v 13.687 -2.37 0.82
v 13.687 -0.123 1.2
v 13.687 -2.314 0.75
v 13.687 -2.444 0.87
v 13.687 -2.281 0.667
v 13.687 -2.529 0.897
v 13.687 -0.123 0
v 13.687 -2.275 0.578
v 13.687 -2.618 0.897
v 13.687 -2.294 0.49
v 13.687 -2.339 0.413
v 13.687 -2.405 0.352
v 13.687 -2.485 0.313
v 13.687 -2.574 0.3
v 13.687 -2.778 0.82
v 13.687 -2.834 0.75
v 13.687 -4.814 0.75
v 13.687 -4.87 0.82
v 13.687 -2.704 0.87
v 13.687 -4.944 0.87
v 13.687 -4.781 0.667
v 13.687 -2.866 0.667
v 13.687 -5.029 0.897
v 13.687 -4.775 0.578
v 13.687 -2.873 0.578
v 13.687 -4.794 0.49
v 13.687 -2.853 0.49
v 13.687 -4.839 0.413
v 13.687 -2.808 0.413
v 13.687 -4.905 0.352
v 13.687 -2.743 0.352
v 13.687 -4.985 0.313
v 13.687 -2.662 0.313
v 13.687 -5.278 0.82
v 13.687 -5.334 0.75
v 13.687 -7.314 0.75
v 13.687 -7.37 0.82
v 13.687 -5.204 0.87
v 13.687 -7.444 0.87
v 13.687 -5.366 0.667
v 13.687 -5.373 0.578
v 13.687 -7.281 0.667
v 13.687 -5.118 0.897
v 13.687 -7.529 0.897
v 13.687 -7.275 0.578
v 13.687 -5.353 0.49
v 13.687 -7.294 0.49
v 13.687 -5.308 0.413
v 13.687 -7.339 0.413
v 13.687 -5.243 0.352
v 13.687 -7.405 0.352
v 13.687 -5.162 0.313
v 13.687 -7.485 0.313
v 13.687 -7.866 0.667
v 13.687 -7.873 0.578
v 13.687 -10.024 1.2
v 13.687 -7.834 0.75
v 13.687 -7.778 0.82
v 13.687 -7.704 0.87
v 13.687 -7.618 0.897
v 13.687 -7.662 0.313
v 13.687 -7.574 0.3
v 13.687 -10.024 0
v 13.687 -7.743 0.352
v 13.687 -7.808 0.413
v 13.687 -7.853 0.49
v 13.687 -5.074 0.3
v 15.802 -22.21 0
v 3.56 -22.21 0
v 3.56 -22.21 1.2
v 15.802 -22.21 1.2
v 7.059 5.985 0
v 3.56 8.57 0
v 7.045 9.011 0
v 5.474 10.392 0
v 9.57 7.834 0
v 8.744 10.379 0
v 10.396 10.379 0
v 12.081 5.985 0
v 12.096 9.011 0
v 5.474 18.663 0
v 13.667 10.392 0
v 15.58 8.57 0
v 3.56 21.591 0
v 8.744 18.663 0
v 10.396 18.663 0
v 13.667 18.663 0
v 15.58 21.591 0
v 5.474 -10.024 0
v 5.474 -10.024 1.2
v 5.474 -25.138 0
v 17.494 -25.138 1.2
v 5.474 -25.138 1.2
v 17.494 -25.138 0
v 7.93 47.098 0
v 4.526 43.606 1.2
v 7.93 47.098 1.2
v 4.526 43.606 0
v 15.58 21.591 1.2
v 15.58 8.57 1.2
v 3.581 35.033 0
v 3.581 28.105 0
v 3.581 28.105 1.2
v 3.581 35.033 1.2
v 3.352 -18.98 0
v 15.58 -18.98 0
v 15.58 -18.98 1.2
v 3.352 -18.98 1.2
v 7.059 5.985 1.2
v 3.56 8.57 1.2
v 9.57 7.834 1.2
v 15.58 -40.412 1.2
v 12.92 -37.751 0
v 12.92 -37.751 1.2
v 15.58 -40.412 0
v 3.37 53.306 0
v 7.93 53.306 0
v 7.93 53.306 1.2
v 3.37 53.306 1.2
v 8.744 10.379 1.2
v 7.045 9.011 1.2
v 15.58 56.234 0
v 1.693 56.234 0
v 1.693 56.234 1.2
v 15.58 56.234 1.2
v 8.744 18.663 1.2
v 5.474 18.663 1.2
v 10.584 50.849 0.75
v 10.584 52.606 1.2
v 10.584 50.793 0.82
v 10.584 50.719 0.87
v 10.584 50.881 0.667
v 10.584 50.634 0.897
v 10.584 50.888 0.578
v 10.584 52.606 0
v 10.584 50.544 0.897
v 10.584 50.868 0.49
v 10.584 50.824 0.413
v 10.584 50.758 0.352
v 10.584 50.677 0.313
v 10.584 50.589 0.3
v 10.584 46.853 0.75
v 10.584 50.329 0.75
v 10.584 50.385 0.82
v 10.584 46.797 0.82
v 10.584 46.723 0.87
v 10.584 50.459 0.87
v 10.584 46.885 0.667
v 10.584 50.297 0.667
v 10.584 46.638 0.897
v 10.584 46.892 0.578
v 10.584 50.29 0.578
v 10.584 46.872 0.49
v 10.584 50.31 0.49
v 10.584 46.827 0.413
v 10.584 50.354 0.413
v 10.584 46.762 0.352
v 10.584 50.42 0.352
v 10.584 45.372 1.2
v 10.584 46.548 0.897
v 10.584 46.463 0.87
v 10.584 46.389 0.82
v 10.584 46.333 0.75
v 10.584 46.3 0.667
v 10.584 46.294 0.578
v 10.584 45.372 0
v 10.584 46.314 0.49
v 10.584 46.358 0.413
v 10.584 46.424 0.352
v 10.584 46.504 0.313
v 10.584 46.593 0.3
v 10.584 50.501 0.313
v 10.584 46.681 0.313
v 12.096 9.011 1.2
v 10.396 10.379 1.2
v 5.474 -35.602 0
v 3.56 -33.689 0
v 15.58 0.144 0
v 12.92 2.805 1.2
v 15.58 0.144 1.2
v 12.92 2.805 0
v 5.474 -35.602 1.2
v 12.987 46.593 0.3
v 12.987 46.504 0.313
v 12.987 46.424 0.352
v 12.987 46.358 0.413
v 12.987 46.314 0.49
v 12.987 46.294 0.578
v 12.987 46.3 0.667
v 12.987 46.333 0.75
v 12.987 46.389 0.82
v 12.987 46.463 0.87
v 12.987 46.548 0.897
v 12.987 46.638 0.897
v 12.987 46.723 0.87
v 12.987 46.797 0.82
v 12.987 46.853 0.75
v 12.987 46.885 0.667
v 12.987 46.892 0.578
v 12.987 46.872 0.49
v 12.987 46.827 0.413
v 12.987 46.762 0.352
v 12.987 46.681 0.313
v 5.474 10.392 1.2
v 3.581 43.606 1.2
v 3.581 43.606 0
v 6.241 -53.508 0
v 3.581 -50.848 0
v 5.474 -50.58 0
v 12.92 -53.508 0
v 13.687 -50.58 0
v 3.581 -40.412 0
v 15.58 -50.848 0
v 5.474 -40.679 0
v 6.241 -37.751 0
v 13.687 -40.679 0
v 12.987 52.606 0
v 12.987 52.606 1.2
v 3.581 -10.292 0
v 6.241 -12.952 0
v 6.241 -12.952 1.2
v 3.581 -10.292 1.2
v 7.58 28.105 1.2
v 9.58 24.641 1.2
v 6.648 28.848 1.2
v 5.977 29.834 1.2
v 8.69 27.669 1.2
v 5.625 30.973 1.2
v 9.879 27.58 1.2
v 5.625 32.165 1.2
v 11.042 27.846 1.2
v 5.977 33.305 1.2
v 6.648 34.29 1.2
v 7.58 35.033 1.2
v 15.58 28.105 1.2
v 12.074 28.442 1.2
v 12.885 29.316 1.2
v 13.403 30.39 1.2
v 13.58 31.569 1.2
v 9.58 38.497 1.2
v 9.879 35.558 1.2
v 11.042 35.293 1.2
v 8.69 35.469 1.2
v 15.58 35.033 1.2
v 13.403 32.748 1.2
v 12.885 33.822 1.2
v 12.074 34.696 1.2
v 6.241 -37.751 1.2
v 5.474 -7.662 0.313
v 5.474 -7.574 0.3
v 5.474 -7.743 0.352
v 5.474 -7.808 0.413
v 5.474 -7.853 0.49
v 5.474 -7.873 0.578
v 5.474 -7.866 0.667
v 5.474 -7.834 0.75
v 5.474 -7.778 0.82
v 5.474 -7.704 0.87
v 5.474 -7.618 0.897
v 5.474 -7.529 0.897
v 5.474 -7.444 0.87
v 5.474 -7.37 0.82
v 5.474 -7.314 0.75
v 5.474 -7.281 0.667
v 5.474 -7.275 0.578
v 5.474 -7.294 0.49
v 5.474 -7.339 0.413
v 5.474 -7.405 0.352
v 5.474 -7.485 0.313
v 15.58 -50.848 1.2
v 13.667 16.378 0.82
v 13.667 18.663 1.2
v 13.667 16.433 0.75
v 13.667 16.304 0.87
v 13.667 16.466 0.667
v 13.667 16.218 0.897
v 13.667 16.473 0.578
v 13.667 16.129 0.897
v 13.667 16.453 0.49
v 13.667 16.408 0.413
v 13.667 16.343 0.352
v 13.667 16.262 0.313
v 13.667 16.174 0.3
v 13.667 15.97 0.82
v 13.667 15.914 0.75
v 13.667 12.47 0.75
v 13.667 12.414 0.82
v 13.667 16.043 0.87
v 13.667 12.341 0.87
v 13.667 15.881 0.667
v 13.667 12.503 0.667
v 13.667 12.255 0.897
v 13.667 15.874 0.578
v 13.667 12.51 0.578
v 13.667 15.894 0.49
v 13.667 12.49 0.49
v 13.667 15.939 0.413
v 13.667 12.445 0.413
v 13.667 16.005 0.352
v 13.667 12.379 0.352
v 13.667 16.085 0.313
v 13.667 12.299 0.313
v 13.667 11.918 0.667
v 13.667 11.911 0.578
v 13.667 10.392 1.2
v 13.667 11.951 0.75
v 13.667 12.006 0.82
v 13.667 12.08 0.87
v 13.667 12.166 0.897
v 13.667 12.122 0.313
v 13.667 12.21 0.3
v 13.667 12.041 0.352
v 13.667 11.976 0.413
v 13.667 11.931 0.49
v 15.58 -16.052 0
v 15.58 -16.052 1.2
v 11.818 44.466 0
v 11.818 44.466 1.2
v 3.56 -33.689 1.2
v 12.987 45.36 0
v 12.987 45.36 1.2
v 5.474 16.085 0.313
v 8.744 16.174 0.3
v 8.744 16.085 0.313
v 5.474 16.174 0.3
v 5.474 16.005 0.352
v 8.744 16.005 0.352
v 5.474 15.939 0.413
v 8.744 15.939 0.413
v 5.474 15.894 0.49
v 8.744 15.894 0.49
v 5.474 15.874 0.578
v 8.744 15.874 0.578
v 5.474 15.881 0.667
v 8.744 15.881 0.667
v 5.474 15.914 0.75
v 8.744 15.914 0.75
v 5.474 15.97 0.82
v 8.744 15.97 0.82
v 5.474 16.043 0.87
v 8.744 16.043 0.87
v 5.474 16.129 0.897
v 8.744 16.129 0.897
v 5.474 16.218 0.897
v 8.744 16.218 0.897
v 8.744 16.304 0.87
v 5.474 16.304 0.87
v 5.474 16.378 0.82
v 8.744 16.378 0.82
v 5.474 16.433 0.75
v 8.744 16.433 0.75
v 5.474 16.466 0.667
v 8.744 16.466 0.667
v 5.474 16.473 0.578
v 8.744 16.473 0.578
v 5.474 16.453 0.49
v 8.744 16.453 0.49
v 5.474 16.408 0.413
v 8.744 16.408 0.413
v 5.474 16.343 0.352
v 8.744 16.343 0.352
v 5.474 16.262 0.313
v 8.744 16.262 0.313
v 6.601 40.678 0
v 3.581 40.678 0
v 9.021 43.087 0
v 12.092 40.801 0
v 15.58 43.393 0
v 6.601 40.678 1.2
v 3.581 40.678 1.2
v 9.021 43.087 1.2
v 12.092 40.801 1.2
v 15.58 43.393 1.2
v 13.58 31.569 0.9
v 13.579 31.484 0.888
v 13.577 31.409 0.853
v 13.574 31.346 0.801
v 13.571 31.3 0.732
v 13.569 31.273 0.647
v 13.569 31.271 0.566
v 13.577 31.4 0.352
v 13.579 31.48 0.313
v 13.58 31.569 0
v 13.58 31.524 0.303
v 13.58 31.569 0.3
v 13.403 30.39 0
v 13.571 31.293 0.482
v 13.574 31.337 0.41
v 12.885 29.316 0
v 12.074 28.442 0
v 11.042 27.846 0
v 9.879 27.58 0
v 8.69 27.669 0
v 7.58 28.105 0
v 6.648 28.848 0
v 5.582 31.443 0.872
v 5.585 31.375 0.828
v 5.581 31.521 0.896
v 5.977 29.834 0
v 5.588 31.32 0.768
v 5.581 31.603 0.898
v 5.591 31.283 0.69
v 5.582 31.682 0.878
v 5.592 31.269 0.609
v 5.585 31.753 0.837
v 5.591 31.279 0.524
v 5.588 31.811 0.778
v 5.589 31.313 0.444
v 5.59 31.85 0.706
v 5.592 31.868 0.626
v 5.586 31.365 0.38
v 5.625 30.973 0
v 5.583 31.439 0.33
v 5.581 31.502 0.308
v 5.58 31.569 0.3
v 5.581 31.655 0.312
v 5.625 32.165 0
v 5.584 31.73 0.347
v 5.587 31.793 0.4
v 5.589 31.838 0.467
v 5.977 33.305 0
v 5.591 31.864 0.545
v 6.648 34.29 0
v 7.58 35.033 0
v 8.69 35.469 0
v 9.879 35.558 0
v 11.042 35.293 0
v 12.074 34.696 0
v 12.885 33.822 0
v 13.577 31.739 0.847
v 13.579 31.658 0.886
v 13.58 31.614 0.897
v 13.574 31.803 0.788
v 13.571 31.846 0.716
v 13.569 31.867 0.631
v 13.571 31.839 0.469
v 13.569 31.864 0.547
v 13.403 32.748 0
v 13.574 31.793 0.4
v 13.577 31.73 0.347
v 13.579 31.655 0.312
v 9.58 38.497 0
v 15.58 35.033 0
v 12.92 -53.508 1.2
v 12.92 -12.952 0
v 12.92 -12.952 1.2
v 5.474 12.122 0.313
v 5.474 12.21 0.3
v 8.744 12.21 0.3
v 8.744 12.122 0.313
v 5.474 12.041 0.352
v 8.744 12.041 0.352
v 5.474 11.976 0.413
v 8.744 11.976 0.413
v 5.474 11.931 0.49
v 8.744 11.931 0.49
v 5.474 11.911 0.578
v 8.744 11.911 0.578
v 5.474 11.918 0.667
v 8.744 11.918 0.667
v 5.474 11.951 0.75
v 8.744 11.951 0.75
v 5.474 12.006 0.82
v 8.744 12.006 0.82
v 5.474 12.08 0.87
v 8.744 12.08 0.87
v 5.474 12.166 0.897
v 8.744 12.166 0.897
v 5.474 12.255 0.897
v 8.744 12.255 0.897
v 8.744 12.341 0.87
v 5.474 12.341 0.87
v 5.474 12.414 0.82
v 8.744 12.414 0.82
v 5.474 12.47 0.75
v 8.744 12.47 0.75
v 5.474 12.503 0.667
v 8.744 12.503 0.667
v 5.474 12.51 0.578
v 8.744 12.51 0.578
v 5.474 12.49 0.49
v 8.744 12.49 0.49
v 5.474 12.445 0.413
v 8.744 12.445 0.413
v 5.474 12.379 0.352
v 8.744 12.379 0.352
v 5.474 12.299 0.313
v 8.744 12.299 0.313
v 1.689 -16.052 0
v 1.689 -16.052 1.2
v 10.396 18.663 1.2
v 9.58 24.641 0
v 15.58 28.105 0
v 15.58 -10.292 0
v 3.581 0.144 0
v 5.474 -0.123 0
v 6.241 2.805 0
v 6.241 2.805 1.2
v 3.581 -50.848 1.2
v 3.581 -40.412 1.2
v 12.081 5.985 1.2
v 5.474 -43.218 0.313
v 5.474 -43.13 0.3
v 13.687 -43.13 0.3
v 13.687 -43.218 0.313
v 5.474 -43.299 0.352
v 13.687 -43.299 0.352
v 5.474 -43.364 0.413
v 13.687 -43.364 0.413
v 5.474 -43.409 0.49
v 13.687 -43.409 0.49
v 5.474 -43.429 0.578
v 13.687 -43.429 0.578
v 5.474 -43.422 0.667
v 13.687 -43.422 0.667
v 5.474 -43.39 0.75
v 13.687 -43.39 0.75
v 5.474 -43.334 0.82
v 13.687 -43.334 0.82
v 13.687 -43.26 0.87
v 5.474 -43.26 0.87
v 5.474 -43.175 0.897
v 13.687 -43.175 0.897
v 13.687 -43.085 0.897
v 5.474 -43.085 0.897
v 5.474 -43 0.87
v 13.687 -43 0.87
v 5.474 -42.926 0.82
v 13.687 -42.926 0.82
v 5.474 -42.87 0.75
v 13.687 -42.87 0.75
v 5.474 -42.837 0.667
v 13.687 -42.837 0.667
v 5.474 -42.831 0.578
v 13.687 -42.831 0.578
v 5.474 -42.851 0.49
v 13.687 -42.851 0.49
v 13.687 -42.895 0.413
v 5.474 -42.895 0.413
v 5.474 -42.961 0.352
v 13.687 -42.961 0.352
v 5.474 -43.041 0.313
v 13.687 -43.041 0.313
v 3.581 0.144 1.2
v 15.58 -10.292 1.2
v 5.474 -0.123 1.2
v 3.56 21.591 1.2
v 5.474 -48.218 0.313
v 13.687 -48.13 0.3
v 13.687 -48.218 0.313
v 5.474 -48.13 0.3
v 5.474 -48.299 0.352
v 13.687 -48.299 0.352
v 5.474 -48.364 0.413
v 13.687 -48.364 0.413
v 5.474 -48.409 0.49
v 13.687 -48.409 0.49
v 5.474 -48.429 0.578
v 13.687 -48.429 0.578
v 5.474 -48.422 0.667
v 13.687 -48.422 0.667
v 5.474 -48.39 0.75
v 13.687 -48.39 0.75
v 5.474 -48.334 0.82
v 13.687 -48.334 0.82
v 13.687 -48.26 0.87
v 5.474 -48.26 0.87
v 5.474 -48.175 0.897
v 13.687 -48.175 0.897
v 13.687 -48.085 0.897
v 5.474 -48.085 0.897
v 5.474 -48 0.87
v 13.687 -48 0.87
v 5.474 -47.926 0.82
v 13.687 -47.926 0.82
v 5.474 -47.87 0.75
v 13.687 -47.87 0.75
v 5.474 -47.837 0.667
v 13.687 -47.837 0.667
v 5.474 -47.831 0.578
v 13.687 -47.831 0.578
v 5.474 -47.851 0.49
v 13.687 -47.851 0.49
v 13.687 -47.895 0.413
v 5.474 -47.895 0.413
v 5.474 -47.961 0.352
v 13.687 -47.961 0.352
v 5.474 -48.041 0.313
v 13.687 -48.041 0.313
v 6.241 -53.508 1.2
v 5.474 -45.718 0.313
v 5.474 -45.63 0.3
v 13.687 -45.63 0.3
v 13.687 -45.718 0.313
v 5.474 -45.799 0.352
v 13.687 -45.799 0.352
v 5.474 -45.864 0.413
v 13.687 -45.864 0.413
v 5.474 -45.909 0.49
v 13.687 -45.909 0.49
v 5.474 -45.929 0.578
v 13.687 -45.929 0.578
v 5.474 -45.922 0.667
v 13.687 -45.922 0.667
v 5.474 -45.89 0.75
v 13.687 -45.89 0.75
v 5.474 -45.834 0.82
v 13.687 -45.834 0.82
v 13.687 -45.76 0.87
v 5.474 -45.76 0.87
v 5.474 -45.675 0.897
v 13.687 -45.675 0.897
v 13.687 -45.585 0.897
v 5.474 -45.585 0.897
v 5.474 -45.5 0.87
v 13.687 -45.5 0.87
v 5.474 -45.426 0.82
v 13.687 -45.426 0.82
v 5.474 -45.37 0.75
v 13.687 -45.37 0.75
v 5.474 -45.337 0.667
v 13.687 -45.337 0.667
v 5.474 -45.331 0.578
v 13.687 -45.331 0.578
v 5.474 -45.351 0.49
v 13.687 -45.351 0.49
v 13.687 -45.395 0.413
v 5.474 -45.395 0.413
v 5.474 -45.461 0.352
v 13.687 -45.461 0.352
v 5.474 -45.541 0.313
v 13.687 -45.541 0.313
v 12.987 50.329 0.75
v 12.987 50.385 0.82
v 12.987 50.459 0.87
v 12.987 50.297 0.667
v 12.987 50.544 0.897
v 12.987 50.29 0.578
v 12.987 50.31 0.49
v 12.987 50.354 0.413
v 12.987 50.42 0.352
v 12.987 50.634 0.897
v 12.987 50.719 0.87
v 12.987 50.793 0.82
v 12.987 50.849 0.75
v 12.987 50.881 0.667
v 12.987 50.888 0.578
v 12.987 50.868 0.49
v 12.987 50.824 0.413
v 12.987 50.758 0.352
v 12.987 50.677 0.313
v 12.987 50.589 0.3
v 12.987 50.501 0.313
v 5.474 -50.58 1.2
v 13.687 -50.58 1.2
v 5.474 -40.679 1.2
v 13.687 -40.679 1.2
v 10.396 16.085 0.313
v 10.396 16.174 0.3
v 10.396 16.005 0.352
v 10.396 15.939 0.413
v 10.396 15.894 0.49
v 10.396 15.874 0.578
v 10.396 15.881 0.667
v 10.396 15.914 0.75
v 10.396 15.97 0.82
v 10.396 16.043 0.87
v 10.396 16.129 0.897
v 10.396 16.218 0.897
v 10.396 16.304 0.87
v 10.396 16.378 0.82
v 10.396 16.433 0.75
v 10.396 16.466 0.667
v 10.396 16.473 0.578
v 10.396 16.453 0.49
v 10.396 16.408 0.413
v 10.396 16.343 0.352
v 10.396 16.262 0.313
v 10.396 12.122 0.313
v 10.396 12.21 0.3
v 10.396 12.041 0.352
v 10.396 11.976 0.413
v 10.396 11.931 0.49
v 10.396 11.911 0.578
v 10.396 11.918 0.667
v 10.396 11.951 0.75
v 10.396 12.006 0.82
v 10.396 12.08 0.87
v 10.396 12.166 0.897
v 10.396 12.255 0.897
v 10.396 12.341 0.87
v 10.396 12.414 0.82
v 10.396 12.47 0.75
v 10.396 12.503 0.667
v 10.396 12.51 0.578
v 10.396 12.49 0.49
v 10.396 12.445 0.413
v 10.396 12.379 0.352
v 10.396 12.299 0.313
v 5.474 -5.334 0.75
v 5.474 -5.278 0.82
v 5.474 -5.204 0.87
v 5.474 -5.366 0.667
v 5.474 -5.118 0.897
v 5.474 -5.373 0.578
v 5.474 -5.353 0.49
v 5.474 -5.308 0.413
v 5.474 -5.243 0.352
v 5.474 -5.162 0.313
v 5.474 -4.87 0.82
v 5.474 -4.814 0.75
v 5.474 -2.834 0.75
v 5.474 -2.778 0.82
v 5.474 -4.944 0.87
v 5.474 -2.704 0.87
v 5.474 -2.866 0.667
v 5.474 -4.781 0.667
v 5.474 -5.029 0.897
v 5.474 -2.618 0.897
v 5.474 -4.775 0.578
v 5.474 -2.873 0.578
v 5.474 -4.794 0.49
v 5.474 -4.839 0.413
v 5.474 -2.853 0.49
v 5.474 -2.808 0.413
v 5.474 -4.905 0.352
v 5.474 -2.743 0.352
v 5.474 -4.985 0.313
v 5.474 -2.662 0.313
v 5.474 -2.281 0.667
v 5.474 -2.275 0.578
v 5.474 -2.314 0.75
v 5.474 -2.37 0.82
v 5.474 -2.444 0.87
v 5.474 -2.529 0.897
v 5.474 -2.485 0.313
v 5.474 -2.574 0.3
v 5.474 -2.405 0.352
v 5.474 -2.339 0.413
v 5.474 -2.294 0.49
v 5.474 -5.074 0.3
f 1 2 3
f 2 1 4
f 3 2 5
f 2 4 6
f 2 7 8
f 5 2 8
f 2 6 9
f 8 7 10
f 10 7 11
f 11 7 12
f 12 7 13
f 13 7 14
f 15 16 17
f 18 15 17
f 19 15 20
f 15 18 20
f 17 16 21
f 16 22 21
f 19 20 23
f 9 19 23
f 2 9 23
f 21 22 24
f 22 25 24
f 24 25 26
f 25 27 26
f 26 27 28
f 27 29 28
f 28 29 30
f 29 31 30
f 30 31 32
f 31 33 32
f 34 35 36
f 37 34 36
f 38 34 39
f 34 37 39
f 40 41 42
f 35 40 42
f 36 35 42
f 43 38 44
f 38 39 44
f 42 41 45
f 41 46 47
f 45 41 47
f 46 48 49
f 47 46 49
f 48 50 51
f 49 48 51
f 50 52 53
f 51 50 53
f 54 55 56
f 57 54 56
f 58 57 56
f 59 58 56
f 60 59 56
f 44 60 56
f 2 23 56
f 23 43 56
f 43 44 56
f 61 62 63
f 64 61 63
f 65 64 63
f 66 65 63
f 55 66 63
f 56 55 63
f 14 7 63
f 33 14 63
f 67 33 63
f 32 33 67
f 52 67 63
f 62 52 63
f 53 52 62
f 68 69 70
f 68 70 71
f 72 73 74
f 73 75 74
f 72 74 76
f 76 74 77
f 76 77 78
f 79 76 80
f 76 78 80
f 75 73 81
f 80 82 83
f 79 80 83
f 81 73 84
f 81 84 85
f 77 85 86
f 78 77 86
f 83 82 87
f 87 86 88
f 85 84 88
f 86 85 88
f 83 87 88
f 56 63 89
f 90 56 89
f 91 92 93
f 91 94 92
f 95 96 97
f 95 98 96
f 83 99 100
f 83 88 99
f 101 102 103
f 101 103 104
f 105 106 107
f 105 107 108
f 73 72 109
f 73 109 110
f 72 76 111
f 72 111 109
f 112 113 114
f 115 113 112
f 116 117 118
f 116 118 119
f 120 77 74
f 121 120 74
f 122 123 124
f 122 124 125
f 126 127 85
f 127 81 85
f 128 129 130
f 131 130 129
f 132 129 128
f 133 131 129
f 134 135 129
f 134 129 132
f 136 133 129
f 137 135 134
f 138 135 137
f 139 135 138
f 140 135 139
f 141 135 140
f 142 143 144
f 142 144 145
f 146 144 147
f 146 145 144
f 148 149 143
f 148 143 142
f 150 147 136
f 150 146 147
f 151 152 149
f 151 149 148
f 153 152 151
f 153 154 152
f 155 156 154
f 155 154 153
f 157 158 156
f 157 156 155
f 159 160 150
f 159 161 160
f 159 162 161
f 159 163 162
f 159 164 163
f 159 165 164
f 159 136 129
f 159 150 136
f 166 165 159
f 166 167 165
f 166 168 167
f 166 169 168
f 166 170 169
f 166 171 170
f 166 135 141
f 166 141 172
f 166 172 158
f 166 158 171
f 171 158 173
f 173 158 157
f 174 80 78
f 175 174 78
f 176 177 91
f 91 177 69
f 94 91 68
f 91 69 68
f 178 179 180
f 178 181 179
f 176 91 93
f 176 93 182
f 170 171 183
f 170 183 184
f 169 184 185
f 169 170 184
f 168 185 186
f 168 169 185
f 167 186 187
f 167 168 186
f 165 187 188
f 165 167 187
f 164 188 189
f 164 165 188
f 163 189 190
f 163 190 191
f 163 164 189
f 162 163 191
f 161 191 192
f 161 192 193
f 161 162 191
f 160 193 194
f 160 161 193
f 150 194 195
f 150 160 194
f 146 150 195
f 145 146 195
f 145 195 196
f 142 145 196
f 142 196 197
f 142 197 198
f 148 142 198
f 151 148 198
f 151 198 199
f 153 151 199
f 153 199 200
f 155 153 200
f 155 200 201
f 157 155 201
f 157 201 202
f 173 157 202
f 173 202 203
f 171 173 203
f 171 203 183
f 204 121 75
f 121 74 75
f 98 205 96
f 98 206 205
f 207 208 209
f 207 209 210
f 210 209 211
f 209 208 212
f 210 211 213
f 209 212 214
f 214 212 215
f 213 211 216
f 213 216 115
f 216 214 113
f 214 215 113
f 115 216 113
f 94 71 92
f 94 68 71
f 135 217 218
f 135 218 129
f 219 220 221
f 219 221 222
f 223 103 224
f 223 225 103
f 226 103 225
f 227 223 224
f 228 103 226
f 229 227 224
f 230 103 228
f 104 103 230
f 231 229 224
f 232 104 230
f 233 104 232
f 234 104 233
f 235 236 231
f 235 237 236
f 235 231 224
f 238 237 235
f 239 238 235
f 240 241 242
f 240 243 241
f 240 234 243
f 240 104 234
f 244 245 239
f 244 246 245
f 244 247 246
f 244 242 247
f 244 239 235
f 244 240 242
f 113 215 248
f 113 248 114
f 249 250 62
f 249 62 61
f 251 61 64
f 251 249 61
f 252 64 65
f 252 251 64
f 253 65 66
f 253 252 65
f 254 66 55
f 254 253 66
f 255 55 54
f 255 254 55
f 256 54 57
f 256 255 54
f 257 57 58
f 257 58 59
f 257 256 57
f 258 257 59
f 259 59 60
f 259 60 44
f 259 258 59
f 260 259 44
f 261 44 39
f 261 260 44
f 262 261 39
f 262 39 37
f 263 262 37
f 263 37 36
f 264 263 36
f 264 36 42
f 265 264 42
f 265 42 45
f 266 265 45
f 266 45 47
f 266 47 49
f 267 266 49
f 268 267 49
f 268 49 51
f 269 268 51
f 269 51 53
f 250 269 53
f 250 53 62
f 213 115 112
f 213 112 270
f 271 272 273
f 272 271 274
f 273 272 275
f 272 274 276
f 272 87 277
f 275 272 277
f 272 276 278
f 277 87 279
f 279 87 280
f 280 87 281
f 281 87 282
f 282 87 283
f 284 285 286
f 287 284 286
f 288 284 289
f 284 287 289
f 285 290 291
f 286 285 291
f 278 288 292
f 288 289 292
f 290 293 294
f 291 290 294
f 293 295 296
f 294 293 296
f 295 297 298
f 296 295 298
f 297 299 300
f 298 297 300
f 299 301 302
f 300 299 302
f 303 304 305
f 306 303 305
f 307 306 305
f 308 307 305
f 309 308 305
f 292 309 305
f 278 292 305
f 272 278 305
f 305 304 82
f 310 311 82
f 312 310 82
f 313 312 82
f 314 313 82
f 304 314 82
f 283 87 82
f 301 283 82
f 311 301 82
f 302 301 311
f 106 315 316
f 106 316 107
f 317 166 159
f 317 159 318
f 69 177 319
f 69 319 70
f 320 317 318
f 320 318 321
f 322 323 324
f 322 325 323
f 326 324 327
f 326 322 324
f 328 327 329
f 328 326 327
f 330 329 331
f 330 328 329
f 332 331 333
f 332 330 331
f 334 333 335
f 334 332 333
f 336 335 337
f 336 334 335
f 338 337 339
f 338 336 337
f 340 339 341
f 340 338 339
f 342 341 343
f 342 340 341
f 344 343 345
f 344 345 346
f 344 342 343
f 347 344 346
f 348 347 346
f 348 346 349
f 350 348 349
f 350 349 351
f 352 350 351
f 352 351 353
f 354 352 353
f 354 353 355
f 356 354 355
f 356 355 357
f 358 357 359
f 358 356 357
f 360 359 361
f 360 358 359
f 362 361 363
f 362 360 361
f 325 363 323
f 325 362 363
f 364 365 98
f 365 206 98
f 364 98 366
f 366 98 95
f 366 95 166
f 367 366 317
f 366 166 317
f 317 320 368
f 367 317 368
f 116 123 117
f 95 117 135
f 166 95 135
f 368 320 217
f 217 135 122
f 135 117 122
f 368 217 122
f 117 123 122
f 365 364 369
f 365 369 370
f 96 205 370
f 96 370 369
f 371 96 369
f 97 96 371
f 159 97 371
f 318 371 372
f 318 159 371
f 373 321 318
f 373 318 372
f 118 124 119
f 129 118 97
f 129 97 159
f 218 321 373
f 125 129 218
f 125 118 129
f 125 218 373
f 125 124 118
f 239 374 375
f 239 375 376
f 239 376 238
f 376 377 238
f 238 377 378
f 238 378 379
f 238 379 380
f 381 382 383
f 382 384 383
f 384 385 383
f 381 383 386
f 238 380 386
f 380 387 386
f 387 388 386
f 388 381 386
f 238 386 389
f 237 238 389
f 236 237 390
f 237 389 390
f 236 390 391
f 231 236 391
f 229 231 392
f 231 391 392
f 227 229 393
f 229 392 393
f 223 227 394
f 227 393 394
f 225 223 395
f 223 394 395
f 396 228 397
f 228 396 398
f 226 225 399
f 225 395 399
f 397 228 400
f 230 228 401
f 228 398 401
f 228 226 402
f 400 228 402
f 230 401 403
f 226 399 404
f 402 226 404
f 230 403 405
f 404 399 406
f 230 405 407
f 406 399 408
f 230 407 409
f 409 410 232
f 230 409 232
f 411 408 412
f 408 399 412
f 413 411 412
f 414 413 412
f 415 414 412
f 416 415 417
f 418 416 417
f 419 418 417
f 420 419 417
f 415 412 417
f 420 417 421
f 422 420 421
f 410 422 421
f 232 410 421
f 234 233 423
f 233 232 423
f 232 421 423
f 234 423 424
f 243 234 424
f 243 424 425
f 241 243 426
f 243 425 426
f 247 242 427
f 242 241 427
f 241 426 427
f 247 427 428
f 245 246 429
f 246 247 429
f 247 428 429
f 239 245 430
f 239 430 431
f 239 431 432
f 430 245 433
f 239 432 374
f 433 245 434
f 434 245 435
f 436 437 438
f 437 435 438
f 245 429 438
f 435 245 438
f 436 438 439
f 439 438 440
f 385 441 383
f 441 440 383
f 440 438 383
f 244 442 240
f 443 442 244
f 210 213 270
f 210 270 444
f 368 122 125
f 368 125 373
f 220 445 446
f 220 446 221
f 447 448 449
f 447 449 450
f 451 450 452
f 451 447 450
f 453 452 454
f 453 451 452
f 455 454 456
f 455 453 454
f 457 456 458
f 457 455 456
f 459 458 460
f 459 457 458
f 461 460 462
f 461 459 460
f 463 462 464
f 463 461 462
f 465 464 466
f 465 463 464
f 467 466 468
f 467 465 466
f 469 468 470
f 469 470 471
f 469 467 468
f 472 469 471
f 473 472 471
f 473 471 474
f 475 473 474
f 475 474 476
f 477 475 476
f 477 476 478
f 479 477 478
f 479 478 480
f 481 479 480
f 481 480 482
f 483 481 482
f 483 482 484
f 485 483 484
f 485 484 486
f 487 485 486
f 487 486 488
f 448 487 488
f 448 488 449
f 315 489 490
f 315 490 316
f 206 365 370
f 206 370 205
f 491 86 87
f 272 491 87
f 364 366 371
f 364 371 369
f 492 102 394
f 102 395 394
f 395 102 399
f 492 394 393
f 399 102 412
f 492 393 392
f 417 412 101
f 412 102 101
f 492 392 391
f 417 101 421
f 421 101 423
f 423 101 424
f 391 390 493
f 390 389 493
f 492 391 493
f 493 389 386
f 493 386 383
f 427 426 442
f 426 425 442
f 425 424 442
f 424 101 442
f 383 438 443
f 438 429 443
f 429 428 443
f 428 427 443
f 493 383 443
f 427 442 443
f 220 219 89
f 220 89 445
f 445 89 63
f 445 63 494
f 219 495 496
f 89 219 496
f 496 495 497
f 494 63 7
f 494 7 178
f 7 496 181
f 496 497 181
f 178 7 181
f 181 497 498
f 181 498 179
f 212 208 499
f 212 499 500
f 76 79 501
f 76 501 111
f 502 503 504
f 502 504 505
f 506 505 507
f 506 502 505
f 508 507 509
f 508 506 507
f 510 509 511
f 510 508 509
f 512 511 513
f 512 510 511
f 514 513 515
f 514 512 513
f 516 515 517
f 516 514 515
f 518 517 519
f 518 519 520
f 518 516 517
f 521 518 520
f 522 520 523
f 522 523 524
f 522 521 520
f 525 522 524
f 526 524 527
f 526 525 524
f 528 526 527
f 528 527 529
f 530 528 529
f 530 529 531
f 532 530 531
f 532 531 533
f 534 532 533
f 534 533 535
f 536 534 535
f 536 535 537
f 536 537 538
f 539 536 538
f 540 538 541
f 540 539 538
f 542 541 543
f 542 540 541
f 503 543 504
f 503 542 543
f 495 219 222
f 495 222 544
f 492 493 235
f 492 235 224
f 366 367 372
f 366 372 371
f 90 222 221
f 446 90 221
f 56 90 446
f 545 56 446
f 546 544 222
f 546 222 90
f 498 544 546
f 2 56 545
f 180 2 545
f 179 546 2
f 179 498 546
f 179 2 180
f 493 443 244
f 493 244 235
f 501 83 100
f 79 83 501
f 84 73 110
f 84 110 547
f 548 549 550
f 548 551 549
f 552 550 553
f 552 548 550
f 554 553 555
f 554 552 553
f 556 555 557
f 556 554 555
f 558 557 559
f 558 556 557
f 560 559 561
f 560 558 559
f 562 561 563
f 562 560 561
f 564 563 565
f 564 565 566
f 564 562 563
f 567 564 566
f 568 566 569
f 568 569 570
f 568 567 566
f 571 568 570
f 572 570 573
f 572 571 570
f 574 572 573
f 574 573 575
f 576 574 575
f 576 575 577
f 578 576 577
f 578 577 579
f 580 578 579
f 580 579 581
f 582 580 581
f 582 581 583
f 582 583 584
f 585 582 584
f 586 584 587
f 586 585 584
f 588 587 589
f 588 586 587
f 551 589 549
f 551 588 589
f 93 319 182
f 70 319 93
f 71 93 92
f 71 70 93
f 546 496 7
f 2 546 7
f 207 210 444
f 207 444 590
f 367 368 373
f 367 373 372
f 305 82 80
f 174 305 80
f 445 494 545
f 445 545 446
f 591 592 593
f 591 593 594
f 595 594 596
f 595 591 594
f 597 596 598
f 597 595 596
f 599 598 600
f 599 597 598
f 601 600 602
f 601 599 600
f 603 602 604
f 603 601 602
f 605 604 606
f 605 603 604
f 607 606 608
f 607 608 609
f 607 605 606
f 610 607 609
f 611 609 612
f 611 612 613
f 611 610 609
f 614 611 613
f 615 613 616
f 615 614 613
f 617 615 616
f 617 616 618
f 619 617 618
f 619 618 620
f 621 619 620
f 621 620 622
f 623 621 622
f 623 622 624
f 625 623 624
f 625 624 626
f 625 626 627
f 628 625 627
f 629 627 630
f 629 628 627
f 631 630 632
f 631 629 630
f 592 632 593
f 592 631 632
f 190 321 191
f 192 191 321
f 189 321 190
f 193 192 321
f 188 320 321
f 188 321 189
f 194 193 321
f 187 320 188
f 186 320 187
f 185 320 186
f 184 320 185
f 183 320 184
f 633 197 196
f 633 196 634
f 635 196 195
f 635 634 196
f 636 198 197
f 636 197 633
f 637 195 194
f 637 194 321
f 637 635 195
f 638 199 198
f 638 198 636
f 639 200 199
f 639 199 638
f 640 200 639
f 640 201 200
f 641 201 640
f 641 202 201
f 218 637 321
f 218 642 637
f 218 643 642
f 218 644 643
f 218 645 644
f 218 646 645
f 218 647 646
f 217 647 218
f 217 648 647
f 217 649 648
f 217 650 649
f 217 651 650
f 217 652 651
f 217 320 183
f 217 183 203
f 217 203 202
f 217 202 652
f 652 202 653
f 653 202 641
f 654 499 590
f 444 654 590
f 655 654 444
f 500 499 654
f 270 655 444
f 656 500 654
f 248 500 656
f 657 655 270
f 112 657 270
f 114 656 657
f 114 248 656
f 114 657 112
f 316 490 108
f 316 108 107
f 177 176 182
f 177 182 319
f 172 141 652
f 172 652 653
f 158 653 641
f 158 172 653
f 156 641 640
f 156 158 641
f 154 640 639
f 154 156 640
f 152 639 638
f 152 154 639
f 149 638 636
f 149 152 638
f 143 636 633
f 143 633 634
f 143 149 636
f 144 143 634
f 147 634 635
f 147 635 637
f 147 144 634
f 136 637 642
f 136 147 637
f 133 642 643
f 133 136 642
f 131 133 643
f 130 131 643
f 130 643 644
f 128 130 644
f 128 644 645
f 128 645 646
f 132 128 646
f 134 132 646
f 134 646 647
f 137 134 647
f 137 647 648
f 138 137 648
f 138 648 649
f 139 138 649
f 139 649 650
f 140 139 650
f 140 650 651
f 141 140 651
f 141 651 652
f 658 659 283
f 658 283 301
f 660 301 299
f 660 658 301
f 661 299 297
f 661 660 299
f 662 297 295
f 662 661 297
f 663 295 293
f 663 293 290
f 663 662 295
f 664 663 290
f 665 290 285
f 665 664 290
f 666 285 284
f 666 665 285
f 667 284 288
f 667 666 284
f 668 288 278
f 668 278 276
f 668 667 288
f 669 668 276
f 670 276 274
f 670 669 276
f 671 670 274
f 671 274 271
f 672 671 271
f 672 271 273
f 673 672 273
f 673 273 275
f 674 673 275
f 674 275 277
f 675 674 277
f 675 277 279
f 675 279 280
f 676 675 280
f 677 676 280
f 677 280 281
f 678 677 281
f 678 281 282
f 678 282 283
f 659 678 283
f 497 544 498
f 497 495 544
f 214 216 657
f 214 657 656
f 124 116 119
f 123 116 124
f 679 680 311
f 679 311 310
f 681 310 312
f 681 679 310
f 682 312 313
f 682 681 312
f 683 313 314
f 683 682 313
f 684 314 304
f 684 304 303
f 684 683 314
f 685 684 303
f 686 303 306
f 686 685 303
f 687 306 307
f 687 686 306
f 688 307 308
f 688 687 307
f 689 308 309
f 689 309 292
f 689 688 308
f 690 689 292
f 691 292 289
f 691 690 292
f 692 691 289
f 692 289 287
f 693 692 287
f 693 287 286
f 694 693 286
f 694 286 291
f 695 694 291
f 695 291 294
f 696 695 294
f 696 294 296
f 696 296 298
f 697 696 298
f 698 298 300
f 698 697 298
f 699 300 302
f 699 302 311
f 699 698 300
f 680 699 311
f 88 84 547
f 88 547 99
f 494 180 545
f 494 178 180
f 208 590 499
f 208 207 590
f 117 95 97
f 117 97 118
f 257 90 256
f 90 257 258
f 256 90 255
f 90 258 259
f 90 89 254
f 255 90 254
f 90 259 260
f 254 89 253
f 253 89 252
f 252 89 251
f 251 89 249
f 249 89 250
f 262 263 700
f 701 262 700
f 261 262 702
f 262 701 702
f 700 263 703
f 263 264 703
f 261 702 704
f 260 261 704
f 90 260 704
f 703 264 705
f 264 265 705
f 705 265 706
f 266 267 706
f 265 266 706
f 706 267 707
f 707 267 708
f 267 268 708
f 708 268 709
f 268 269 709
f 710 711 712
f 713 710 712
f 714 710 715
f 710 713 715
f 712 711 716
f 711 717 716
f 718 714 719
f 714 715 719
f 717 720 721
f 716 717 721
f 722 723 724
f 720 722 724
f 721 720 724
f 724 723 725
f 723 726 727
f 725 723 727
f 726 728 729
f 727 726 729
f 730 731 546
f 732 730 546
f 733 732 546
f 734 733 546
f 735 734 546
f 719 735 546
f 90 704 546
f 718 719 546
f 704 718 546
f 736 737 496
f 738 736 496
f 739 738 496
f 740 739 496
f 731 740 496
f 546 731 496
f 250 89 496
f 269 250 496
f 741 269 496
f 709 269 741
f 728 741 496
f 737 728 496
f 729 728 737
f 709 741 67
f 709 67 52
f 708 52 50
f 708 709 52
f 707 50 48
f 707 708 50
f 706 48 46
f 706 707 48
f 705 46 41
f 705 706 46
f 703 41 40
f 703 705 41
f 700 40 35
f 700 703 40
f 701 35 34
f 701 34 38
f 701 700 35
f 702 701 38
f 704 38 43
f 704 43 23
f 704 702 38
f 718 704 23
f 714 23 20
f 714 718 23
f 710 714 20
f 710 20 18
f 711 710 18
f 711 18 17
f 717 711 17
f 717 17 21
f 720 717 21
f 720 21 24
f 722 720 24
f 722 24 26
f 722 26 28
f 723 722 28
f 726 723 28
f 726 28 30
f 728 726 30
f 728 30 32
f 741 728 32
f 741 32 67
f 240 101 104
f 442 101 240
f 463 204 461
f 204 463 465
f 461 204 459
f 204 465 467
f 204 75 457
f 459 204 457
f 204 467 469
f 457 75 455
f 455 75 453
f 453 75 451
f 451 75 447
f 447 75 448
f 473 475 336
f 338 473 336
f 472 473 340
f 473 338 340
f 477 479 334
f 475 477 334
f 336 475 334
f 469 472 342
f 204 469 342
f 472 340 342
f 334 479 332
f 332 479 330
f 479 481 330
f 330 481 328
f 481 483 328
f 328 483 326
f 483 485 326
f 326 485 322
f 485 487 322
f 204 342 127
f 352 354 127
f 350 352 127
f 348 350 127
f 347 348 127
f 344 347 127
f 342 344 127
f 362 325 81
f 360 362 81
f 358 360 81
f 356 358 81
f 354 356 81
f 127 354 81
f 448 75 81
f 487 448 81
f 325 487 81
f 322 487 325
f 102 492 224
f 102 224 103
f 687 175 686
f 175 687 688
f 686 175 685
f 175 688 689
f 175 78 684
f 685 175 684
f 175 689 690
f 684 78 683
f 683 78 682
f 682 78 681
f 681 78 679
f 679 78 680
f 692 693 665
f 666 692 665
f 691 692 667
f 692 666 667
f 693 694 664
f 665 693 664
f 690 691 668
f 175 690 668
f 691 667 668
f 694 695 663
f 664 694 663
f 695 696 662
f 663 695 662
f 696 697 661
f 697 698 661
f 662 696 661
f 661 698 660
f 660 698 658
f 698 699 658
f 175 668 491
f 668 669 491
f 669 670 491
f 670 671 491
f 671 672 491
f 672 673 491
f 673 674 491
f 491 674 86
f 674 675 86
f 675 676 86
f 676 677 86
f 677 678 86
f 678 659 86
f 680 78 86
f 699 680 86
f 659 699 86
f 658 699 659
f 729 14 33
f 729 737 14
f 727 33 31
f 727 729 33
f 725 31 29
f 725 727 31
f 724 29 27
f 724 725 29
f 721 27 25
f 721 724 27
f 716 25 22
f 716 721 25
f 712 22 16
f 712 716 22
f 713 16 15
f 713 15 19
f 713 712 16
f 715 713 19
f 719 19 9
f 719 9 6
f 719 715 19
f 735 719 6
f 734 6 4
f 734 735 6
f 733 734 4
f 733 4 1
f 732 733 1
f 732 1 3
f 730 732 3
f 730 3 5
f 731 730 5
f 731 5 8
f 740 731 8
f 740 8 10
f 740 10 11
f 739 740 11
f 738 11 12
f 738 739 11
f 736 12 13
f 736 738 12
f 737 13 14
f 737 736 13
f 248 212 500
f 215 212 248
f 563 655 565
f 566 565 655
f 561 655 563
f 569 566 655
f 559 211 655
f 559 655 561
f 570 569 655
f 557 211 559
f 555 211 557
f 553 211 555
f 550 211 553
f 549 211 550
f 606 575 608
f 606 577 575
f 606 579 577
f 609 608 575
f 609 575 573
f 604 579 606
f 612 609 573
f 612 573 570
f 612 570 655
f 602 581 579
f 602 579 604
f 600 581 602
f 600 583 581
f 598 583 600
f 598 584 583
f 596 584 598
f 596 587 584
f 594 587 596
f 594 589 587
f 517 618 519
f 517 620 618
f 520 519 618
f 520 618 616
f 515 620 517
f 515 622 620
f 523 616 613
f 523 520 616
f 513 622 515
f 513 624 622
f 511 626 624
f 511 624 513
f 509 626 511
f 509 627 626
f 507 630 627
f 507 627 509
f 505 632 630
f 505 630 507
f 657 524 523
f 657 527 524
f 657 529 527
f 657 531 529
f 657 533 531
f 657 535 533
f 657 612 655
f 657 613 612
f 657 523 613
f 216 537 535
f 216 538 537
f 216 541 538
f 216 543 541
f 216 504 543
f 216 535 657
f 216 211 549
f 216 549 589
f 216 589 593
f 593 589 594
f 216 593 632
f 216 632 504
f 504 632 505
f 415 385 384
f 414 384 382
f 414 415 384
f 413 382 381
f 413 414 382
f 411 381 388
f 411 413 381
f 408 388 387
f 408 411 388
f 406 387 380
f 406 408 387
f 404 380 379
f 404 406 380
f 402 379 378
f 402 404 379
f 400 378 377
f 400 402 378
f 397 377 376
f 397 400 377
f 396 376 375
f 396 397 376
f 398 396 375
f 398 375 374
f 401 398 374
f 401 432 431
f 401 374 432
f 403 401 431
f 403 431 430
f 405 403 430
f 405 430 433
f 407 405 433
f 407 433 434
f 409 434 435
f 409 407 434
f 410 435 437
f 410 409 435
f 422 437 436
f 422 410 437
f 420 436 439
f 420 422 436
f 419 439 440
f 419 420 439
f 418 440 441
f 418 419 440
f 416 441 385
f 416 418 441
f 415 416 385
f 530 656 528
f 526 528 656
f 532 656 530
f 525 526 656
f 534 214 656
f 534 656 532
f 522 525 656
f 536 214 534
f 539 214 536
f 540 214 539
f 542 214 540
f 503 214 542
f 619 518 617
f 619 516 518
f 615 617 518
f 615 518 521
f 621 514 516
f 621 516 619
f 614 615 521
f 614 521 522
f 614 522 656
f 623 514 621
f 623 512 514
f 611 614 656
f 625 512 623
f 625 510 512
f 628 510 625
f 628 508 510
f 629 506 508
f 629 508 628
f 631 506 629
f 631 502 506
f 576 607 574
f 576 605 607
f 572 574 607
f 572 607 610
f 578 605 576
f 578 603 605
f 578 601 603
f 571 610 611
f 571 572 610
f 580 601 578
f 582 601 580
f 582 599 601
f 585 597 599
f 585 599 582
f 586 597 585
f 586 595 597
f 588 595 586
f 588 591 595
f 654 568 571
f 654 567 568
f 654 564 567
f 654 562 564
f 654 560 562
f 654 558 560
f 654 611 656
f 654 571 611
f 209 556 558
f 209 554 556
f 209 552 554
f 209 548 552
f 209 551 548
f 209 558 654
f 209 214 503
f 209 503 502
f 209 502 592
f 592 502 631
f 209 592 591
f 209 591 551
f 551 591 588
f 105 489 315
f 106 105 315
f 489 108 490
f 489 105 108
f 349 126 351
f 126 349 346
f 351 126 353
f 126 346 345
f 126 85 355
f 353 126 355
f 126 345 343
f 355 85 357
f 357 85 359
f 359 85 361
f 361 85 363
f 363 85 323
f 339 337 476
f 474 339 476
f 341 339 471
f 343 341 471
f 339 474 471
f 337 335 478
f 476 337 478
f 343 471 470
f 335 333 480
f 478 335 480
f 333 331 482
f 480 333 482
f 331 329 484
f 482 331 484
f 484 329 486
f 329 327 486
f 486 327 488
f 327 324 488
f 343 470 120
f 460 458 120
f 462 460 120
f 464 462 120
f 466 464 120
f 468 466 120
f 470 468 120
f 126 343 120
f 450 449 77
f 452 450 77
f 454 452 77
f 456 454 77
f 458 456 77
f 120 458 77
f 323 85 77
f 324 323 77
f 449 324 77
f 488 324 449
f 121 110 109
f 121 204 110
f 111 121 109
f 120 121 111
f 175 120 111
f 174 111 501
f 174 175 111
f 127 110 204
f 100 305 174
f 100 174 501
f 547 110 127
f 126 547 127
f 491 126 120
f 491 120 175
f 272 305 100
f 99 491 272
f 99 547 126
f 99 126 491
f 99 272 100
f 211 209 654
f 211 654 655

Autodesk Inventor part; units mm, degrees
ref_plane "YZ Plane" through (0, 0, 0) normal (1, 0, 0) x (0, 1, 0)
ref_plane "XZ Plane" through (0, 0, 0) normal (0, 1, 0) x (-1, 0, 0)
ref_plane "XY Plane" through (0, 0, 0) normal (0, 0, 1) x (1, 0, 0)
sketch "Sketch1" plane through (0, 0, 0) normal (0, 0, 1) x (1, 0, 0)
  line L0 (13.187, 45.2611) -> (13.187, 52.8058) construction
  line L1 (11.8207, 44.2163) -> (13.187, 45.2611) construction
  line L2 (10.3841, 45.2712) -> (11.8207, 44.2163) construction
  line L3 (10.3841, 52.8058) -> (10.3841, 45.2712) construction
  line L4 (13.187, 52.8058) -> (10.3841, 52.8058) construction
  line L5 (3.0806, 40.1778) -> (3.0806, 44.1058) construction
  line L6 (6.8077, 40.1778) -> (3.0806, 40.1778) construction
  line L7 (9.0681, 42.4281) -> (6.8077, 40.1778) construction
  line L8 (12.0919, 40.1778) -> (9.0681, 42.4281) construction
  line L9 (16.0802, 43.1414) -> (12.0919, 40.1778) construction
  line L10 (16.0802, 56.7338) -> (16.0802, 43.1414) construction
  line L11 (0.8302, 56.7338) -> (16.0802, 56.7338) construction
  line L12 (3.0806, 52.8058) -> (0.8302, 56.7338) construction
  line L13 (7.4305, 52.8058) -> (3.0806, 52.8058) construction
  line L14 (7.4305, 47.3013) -> (7.4305, 52.8058) construction
  line L15 (4.3156, 44.1058) -> (7.4305, 47.3013) construction
  line L16 (3.0806, 44.1058) -> (4.3156, 44.1058) construction
  line L17 (3.0806, 27.8164) -> (3.0806, 35.3218) construction
  line L18 (9.5804, 24.0637) -> (3.0806, 27.8164) construction
  line L19 (16.0802, 27.8164) -> (9.5804, 24.0637) construction
  line L20 (16.0802, 35.3218) -> (16.0802, 27.8164) construction
  line L21 (9.5804, 39.0745) -> (16.0802, 35.3218) construction
  line L22 (3.0806, 35.3218) -> (9.5804, 39.0745) construction
  circle A0 centre (9.5804, 31.5691) radius 3.5 construction
  line L23 (13.1669, 10.6183) -> (13.1669, 18.163) construction
  line L24 (12.0819, 9.664) -> (13.1669, 10.6183) construction
  line L25 (10.8965, 10.6183) -> (12.0819, 9.664) construction
  line L26 (10.8965, 18.163) -> (10.8965, 10.6183) construction
  line L27 (13.1669, 18.163) -> (10.8965, 18.163) construction
  line L28 (8.2443, 10.6183) -> (8.2443, 18.163) construction
  line L29 (7.0588, 9.664) -> (8.2443, 10.6183) construction
  line L30 (5.9739, 10.6183) -> (7.0588, 9.664) construction
  line L31 (5.9739, 18.163) -> (5.9739, 10.6183) construction
  line L32 (8.2443, 18.163) -> (5.9739, 18.163) construction
  line L33 (7.0588, 5.3642) -> (3.0605, 8.3178) construction
  line L34 (9.5704, 7.2127) -> (7.0588, 5.3642) construction
  line L35 (12.0819, 5.3642) -> (9.5704, 7.2127) construction
  line L36 (16.0802, 8.3178) -> (12.0819, 5.3642) construction
  line L37 (16.0802, 22.091) -> (16.0802, 8.3178) construction
  line L38 (3.0605, 22.091) -> (16.0802, 22.091) construction
  line L39 (3.0605, 8.3178) -> (3.0605, 22.091) construction
  line L40 (13.187, -9.5241) -> (13.187, -0.6233) construction
  line L41 (5.9739, -9.5241) -> (13.187, -9.5241) construction
  line L42 (5.9739, -0.6233) -> (5.9739, -9.5241) construction
  line L43 (13.187, -0.6233) -> (5.9739, -0.6233) construction
  line L44 (6.0341, -13.4521) -> (3.0806, -10.4986) construction
  line L45 (13.1267, -13.4521) -> (6.0341, -13.4521) construction
  line L46 (16.0802, -10.4986) -> (13.1267, -13.4521) construction
  line L47 (16.0802, 0.3512) -> (16.0802, -10.4986) construction
  line L48 (13.1267, 3.3048) -> (16.0802, 0.3512) construction
  line L49 (6.0341, 3.3048) -> (13.1267, 3.3048) construction
  line L50 (3.0806, 0.3512) -> (6.0341, 3.3048) construction
  line L51 (3.0806, -10.4986) -> (3.0806, 0.3512) construction
  line L52 (3.0605, -19.4798) -> (0.8302, -15.5518) construction
  line L53 (16.0802, -19.4798) -> (3.0605, -19.4798) construction
  line L54 (16.0802, -15.5518) -> (16.0802, -19.4798) construction
  line L55 (0.8302, -15.5518) -> (16.0802, -15.5518) construction
  line L56 (5.9739, -36.8094) -> (3.0605, -33.896) construction
  line L57 (5.9739, -25.6381) -> (5.9739, -36.8094) construction
  line L58 (18.3607, -25.6381) -> (5.9739, -25.6381) construction
  line L59 (16.0903, -21.7101) -> (18.3607, -25.6381) construction
  line L60 (3.0605, -21.7101) -> (16.0903, -21.7101) construction
  line L61 (3.0605, -33.896) -> (3.0605, -21.7101) construction
  line L62 (13.187, -50.0803) -> (13.187, -41.1794) construction
  line L63 (5.9739, -50.0803) -> (13.187, -50.0803) construction
  line L64 (5.9739, -41.1794) -> (5.9739, -50.0803) construction
  line L65 (13.187, -41.1794) -> (5.9739, -41.1794) construction
  line L66 (6.0341, -54.0083) -> (3.0806, -51.0548) construction
  line L67 (13.1267, -54.0083) -> (6.0341, -54.0083) construction
  line L68 (16.0802, -51.0548) -> (13.1267, -54.0083) construction
  line L69 (16.0802, -40.2049) -> (16.0802, -51.0548) construction
  line L70 (13.1267, -37.2514) -> (16.0802, -40.2049) construction
  line L71 (6.0341, -37.2514) -> (13.1267, -37.2514) construction
  line L72 (3.0806, -40.2049) -> (6.0341, -37.2514) construction
  line L73 (3.0806, -51.0548) -> (3.0806, -40.2049) construction
  line L74 (7.2305, 52.6058) -> (2.9647, 52.6058)
  line L75 (2.9647, 52.6058) -> (0.4852, 56.9338)
  line L76 (0.4852, 56.9338) -> (16.2802, 56.9338)
  line L77 (16.2802, 56.9338) -> (16.2802, 43.0408)
  line L78 (16.2802, 43.0408) -> (12.0919, 39.9286)
  line L79 (12.0919, 39.9286) -> (9.087, 42.1647)
  line L80 (9.087, 42.1647) -> (6.8903, 39.9778)
  line L81 (6.8903, 39.9778) -> (2.8806, 39.9778)
  line L82 (2.8806, 39.9778) -> (2.8806, 44.3058)
  line L83 (2.8806, 44.3058) -> (4.2313, 44.3058)
  line L84 (4.2313, 44.3058) -> (7.2305, 47.3827)
  line L85 (7.2305, 47.3827) -> (7.2305, 52.6058)
  line L86 (11.8183, 44.4662) -> (12.987, 45.36)
  line L87 (12.987, 45.36) -> (12.987, 52.6058)
  line L88 (12.987, 52.6058) -> (10.5841, 52.6058)
  line L89 (10.5841, 52.6058) -> (10.5841, 45.3724)
  line L90 (10.5841, 45.3724) -> (11.8183, 44.4662)
  circle A1 centre (9.5804, 31.5691) radius 3.3
  line L91 (9.5804, 39.3054) -> (16.2802, 35.4373)
  line L92 (16.2802, 35.4373) -> (16.2802, 27.7009)
  line L93 (16.2802, 27.7009) -> (9.5804, 23.8328)
  line L94 (9.5804, 23.8328) -> (2.8806, 27.7009)
  line L95 (2.8806, 27.7009) -> (2.8806, 35.4373)
  line L96 (2.8806, 35.4373) -> (9.5804, 39.3054)
  line L97 (16.2802, 22.291) -> (16.2802, 8.2169)
  line L98 (16.2802, 8.2169) -> (12.0821, 5.1157)
  line L99 (12.0821, 5.1157) -> (9.5704, 6.9644)
  line L100 (9.5704, 6.9644) -> (7.0586, 5.1157)
  line L101 (7.0586, 5.1157) -> (2.8605, 8.2169)
  line L102 (2.8605, 8.2169) -> (2.8605, 22.291)
  line L103 (2.8605, 22.291) -> (16.2802, 22.291)
  line L104 (8.0443, 17.963) -> (8.0443, 10.7141)
  line L105 (8.0443, 10.7141) -> (7.0645, 9.9253)
  line L106 (7.0645, 9.9253) -> (6.1739, 10.7088)
  line L107 (6.1739, 10.7088) -> (6.1739, 17.963)
  line L108 (6.1739, 17.963) -> (8.0443, 17.963)
  line L109 (11.0965, 10.7141) -> (12.0762, 9.9253)
  line L110 (12.0762, 9.9253) -> (12.9669, 10.7088)
  line L111 (12.9669, 10.7088) -> (12.9669, 17.963)
  line L112 (12.9669, 17.963) -> (11.0965, 17.963)
  line L113 (11.0965, 17.963) -> (11.0965, 10.7141)
  line L114 (13.2095, 3.5048) -> (16.2802, 0.4341)
  line L115 (16.2802, 0.4341) -> (16.2802, -10.5814)
  line L116 (16.2802, -10.5814) -> (13.2095, -13.6521)
  line L117 (13.2095, -13.6521) -> (5.9513, -13.6521)
  line L118 (5.9513, -13.6521) -> (2.8806, -10.5814)
  line L119 (2.8806, -10.5814) -> (2.8806, 0.4341)
  line L120 (2.8806, 0.4341) -> (5.9513, 3.5048)
  line L121 (5.9513, 3.5048) -> (13.2095, 3.5048)
  line L122 (6.1739, -0.8233) -> (6.1739, -9.3241)
  line L123 (6.1739, -9.3241) -> (12.987, -9.3241)
  line L124 (12.987, -9.3241) -> (12.987, -0.8233)
  line L125 (12.987, -0.8233) -> (6.1739, -0.8233)
  line L126 (16.2802, -15.3518) -> (16.2802, -19.6798)
  line L127 (16.2802, -19.6798) -> (2.9441, -19.6798)
  line L128 (2.9441, -19.6798) -> (0.4867, -15.3518)
  line L129 (0.4867, -15.3518) -> (16.2802, -15.3518)
  line L130 (6.1739, -37.2922) -> (2.8605, -33.9788)
  line L131 (2.8605, -33.9788) -> (2.8605, -21.5101)
  line L132 (2.8605, -21.5101) -> (16.2057, -21.5101)
  line L133 (16.2057, -21.5101) -> (18.7073, -25.8381)
  line L134 (18.7073, -25.8381) -> (6.1739, -25.8381)
  line L135 (6.1739, -25.8381) -> (6.1739, -37.2922)
  line L136 (13.2095, -37.0514) -> (16.2802, -40.1221)
  line L137 (16.2802, -40.1221) -> (16.2802, -51.1376)
  line L138 (16.2802, -51.1376) -> (13.2095, -54.2083)
  line L139 (13.2095, -54.2083) -> (5.9513, -54.2083)
  line L140 (5.9513, -54.2083) -> (2.8806, -51.1376)
  line L141 (2.8806, -51.1376) -> (2.8806, -40.1221)
  line L142 (2.8806, -40.1221) -> (5.9513, -37.0514)
  line L143 (5.9513, -37.0514) -> (13.2095, -37.0514)
  line L144 (6.1739, -41.3794) -> (6.1739, -49.8803)
  line L145 (6.1739, -49.8803) -> (12.987, -49.8803)
  line L146 (12.987, -49.8803) -> (12.987, -41.3794)
  line L147 (12.987, -41.3794) -> (6.1739, -41.3794)
  line L148 (15.5802, 43.3928) -> (12.0922, 40.8009)
  line L149 (12.0922, 40.8009) -> (9.0208, 43.0866)
  line L150 (9.0208, 43.0866) -> (6.6012, 40.6778)
  line L151 (6.6012, 40.6778) -> (3.5806, 40.6778)
  line L152 (3.5806, 40.6778) -> (3.5806, 43.6058)
  line L153 (3.5806, 43.6058) -> (4.5265, 43.6058)
  line L154 (4.5265, 43.6058) -> (7.9305, 47.0979)
  line L155 (7.9305, 47.0979) -> (7.9305, 53.3058)
  line L156 (7.9305, 53.3058) -> (3.3704, 53.3058)
  line L157 (3.3704, 53.3058) -> (1.6929, 56.2338)
  line L158 (1.6929, 56.2338) -> (15.5802, 56.2338)
  line L159 (15.5802, 56.2338) -> (15.5802, 43.3928)
  line L160 (13.687, 53.3058) -> (13.687, 45.014)
  line L161 (13.687, 45.014) -> (11.8268, 43.5916)
  line L162 (11.8268, 43.5916) -> (9.8841, 45.018)
  line L163 (9.8841, 45.018) -> (9.8841, 53.3058)
  line L164 (9.8841, 53.3058) -> (13.687, 53.3058)
  line L165 (15.5802, 35.0331) -> (15.5802, 28.1051)
  line L166 (15.5802, 28.1051) -> (9.5804, 24.6411)
  line L167 (9.5804, 24.6411) -> (3.5806, 28.1051)
  line L168 (3.5806, 28.1051) -> (3.5806, 35.0331)
  line L169 (3.5806, 35.0331) -> (9.5804, 38.4971)
  line L170 (9.5804, 38.4971) -> (15.5802, 35.0331)
  circle A2 centre (9.5804, 31.5691) radius 4
  line L171 (13.6669, 18.663) -> (13.6669, 10.3922)
  line L172 (13.6669, 10.3922) -> (12.0961, 9.0106)
  line L173 (12.0961, 9.0106) -> (10.3965, 10.379)
  line L174 (10.3965, 10.379) -> (10.3965, 18.663)
  line L175 (10.3965, 18.663) -> (13.6669, 18.663)
  line L176 (8.7443, 18.663) -> (8.7443, 10.379)
  line L177 (8.7443, 10.379) -> (7.0446, 9.0106)
  line L178 (7.0446, 9.0106) -> (5.4739, 10.3922)
  line L179 (5.4739, 10.3922) -> (5.4739, 18.663)
  line L180 (5.4739, 18.663) -> (8.7443, 18.663)
  line L181 (15.5802, 8.5701) -> (12.0814, 5.9854)
  line L182 (12.0814, 5.9854) -> (9.5704, 7.8335)
  line L183 (9.5704, 7.8335) -> (7.0594, 5.9854)
  line L184 (7.0594, 5.9854) -> (3.5605, 8.5701)
  line L185 (3.5605, 8.5701) -> (3.5605, 21.591)
  line L186 (3.5605, 21.591) -> (15.5802, 21.591)
  line L187 (15.5802, 21.591) -> (15.5802, 8.5701)
  line L188 (13.687, -0.1233) -> (13.687, -10.0241)
  line L189 (13.687, -10.0241) -> (5.4739, -10.0241)
  line L190 (5.4739, -10.0241) -> (5.4739, -0.1233)
  line L191 (5.4739, -0.1233) -> (13.687, -0.1233)
  line L192 (15.5802, -10.2915) -> (12.9196, -12.9521)
  line L193 (12.9196, -12.9521) -> (6.2412, -12.9521)
  line L194 (6.2412, -12.9521) -> (3.5806, -10.2915)
  line L195 (3.5806, -10.2915) -> (3.5806, 0.1441)
  line L196 (3.5806, 0.1441) -> (6.2412, 2.8048)
  line L197 (6.2412, 2.8048) -> (12.9196, 2.8048)
  line L198 (12.9196, 2.8048) -> (15.5802, 0.1441)
  line L199 (15.5802, 0.1441) -> (15.5802, -10.2915)
  line L200 (15.5802, -18.9798) -> (3.3516, -18.9798)
  line L201 (3.3516, -18.9798) -> (1.6891, -16.0518)
  line L202 (1.6891, -16.0518) -> (15.5802, -16.0518)
  line L203 (15.5802, -16.0518) -> (15.5802, -18.9798)
  line L204 (17.4942, -25.1381) -> (5.4739, -25.1381)
  line L205 (5.4739, -25.1381) -> (5.4739, -35.6023)
  line L206 (5.4739, -35.6023) -> (3.5605, -33.6889)
  line L207 (3.5605, -33.6889) -> (3.5605, -22.2101)
  line L208 (3.5605, -22.2101) -> (15.8018, -22.2101)
  line L209 (15.8018, -22.2101) -> (17.4942, -25.1381)
  line L210 (12.9196, -37.7514) -> (15.5802, -40.4121)
  line L211 (15.5802, -40.4121) -> (15.5802, -50.8476)
  line L212 (15.5802, -50.8476) -> (12.9196, -53.5083)
  line L213 (12.9196, -53.5083) -> (6.2412, -53.5083)
  line L214 (6.2412, -53.5083) -> (3.5806, -50.8476)
  line L215 (3.5806, -50.8476) -> (3.5806, -40.4121)
  line L216 (3.5806, -40.4121) -> (6.2412, -37.7514)
  line L217 (6.2412, -37.7514) -> (12.9196, -37.7514)
  line L218 (5.4739, -40.6794) -> (5.4739, -50.5803)
  line L219 (5.4739, -50.5803) -> (13.687, -50.5803)
  line L220 (13.687, -50.5803) -> (13.687, -40.6794)
  line L221 (13.687, -40.6794) -> (5.4739, -40.6794)
  point P0 (0, 0)
  point P1 (6.1739, -37.0514)
  point P2 (5.9422, -37.0605)
extrude "Extrusion1" add sketch "Sketch1" along normal blind 1.2 contours L148 L149 L150 L151 L152 L153 L154 L155 L156 L157 L158 L159 | L160 L161 L162 L163 L164 | L165 L166 L167 L168 L169 L170 | L181 L182 L183 L184 L185 L186 L187 | L192 L193 L194 L195 L196 L197 L198 L199 | L200 L201 L202 L203 | L204 L205 L206 L207 L208 L209 | L210 L211 L212 L213 L214 L215 L216 L217
sketch "Sketch2" plane through (5.4739, -9.3241, 0) normal (1, 0, 0) x (0, 0, -1)
  line L0 (-0.6, 8.5009) -> (-0.6, 0)
  line L1 (-0.6, 4.2504) -> (0, 4.2504)
  line L2 (0, 9.7582) -> (0, -1.2573)
  circle A0 centre (-0.6, 6.7504) radius 0.3
  circle A1 centre (-0.6, 4.2504) radius 0.3
  circle A2 centre (-0.6, 1.7504) radius 0.3
  line L3 (0, -40.5562) -> (0, -32.0553)
  line L4 (0, -32.0553) -> (-1.2, -32.0553)
  line L5 (-1.2, -40.5562) -> (-1.2, -32.0553)
  line L6 (0, -40.5562) -> (-1.2, -40.5562)
  circle A3 centre (-0.6, -33.8057) radius 0.3
  circle A4 centre (-0.6, -36.3057) radius 0.3
  circle A5 centre (-0.6, -38.8057) radius 0.3
  point P0 (0, 9.3241)
  dimension "d15" = 2.5
  dimension "d16" = 0.6
  dimension "d17" = 0.6
  dimension "d18" = 0.6
  dimension "d19" = 2.5
  dimension "d20" = 2.5
  dimension "d21" = 0.6
  dimension "d22" = 0.6
  dimension "d23" = 0.6
extrude "Extrusion2" add sketch "Sketch2" along normal blind 9 contours A0 L0 | A2 L0 | L0 A2 | A1 L1 L0 | L0 A1 | L0 A0 | L1 A1 L0 | A3 | A4 | A5
sketch "Sketch3" plane through (10.5841, 45.3724, 0) normal (1, 0, 0) x (0, 0, -1)
  line L0 (0, 0) -> (0, 7.2333) projected
  line L1 (0, 7.2333) -> (-1.2, 7.2333) projected
  line L2 (-1.2, 0) -> (-1.2, 7.2333) projected
  line L3 (0, 0) -> (-1.2, 0) projected
  line L4 (0, -0.9062) -> (0, 0) projected
  line L5 (0, 0) -> (-1.2, 0) projected
  line L6 (-1.2, -0.9062) -> (-1.2, 0) projected
  line L7 (0, -0.9062) -> (-1.2, -0.9062) projected
  circle A0 centre (-0.6, 5.2166) radius 0.3
  circle A1 centre (-0.6, 1.2204) radius 0.3
  point P0 (0, -45.3724)
  dimension "d26" = 0.6
  dimension "d27" = 0.6
extrude "Extrusion3" add sketch "Sketch3" along normal blind 3 contours A0 | A1
sketch "Sketch4" plane through (5.4739, 10.7088, 0) normal (1, 0, 0) x (0, 0, -1)
  line L0 (0, 0) -> (0, 7.2542)
  line L1 (0, 7.2542) -> (-1.2, 7.2542)
  line L2 (-1.2, 0) -> (-1.2, 7.2542)
  line L3 (0, 0) -> (-1.2, 0)
  line L4 (0, -0.7835) -> (0, 0)
  line L5 (0, 0) -> (-1.2, 0)
  line L6 (-1.2, -0.7835) -> (-1.2, 0)
  line L7 (0, -0.7835) -> (-1.2, -0.7835)
  circle A0 centre (-0.6, 5.4648) radius 0.3
  circle A1 centre (-0.6, 1.5016) radius 0.3
  line L8 (-1.2, 17.5603) -> (-1.2, 24.1603)
  line L9 (0, 17.5603) -> (0, 24.1603)
  circle A2 centre (-0.6, 20.8603) radius 0.3
  point P0 (0, -10.7088)
  dimension "d30" = 0.6
  dimension "d31" = 0.6
  dimension "d32" = 0.6
extrude "Extrusion4" add sketch "Sketch4" along normal blind 9.4 contours A0 | A1 | A2
equation "\"d2\" = d3"
equation "\"d3\" = d5"
equation "\"d4\" = d6"
equation "\"d6\" = d7"
equation "\"d7\" = d10"
equation "\"d8\" = d7"
equation "\"d9\" = d7"
equation "\"d10\" = d11"
equation "\"d11\" = d12"
equation "\"d12\" = d13"
equation "\"d13\" = d14"
equation "\"d35\" = d37"
equation "\"d36\" = d35"
equation "\"d37\" = d38"
equation "\"d39\" = d41"
equation "\"d41\" = d40"
equation "\"d42\" = d43"
equation "\"d43\" = d40"
equation "\"d44\" = d42"
equation "\"d45\" = d44"
equation "\"d46\" = d45"
equation "\"d47\" = d46"
equation "\"d5\" = 0.2"
equation "\"d14\" = 0.2"
equation "\"d38\" = 0.5"
equation "\"d40\" = 0.5"
properties part number "roboilo"
